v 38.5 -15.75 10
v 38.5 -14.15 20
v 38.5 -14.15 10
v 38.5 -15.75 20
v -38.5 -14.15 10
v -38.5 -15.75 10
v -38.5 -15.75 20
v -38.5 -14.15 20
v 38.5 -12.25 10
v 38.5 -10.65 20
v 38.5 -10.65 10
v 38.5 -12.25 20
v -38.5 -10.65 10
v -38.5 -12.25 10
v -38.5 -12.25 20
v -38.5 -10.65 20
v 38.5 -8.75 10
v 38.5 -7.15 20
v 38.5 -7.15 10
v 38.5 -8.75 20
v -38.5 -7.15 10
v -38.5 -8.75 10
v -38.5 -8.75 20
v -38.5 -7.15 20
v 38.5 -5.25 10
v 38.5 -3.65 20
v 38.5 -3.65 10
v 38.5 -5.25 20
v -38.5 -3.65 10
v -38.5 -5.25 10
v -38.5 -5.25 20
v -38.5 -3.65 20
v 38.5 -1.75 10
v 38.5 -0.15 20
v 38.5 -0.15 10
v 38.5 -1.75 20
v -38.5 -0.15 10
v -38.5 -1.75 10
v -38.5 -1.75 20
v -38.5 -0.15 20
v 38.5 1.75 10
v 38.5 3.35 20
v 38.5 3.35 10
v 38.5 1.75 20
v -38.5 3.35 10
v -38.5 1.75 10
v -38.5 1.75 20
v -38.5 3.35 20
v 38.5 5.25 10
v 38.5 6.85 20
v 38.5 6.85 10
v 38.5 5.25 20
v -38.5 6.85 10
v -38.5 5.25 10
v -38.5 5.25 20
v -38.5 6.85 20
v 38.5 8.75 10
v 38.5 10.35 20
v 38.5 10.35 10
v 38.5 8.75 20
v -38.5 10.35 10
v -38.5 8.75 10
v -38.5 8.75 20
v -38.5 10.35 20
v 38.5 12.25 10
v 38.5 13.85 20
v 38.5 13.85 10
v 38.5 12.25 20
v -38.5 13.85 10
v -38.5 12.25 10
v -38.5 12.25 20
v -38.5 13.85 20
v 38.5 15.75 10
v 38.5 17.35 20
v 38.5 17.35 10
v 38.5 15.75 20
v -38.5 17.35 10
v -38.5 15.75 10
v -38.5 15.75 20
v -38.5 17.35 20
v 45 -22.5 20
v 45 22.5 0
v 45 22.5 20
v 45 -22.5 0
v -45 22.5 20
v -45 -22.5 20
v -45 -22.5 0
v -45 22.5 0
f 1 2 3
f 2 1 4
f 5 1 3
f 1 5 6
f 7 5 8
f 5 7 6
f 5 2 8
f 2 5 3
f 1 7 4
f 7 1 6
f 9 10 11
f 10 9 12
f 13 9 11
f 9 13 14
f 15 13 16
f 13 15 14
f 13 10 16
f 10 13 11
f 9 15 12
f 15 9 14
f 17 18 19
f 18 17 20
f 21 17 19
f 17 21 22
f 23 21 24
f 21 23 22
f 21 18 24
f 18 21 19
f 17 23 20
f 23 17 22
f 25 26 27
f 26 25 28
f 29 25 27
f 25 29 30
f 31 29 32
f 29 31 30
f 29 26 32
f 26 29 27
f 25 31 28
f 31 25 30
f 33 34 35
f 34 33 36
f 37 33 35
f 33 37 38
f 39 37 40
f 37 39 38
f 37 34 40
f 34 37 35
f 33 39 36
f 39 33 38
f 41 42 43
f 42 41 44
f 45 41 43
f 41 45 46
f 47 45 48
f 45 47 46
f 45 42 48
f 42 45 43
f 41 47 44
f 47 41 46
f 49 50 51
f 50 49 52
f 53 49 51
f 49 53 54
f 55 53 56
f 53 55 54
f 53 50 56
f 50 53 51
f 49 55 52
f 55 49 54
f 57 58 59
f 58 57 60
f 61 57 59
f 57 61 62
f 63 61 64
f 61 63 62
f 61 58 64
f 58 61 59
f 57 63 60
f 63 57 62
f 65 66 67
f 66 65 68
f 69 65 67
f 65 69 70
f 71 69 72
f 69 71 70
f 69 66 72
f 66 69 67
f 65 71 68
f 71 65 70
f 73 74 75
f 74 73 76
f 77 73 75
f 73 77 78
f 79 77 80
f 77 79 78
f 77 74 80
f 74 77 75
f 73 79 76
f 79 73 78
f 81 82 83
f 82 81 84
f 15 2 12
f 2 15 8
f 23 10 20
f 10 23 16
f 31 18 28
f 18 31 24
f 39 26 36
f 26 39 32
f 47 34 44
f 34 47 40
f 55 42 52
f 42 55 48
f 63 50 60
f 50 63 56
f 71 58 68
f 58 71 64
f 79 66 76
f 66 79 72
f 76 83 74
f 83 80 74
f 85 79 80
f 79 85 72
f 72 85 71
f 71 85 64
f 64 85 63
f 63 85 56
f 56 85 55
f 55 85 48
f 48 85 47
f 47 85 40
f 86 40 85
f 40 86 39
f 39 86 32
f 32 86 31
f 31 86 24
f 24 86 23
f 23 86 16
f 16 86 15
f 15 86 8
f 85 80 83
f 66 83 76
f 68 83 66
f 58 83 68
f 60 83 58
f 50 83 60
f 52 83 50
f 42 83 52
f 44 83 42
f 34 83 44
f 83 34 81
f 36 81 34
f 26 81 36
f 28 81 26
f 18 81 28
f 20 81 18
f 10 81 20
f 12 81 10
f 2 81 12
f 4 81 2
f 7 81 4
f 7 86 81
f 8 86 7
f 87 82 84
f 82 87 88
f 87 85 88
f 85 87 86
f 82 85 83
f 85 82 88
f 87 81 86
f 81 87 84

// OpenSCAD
// Microscope slide drying rack
// Print orientation: base block on the bed (z = 0), slots open upward.

// ---------------- Parameters ----------------
block_len    = 90;    // block length along X (mm)
block_wid    = 45;    // block width along Y (mm)
block_h      = 20;    // block height along Z (mm)

slot_count   = 10;    // number of slide slots
slot_len     = 77;    // slot length along X (mm)
slot_w       = 1.6;   // slot width along Y (mm)
slot_depth   = 10;    // slot depth from top face (mm)
slot_pitch   = 3.5;   // centre-to-centre spacing in Y (mm)

eps          = 0.5;   // overshoot so cutters pass the top face

$fn = 64;

// ---------------- Model ----------------
difference() {
    // Base block, centred in X and Y, sitting on z = 0
    translate([-block_len/2, -block_wid/2, 0])
        cube([block_len, block_wid, block_h]);

    // Slot group, centred on the block in X and Y
    for (i = [0 : slot_count - 1]) {
        y = (i - (slot_count - 1)/2) * slot_pitch;
        translate([-slot_len/2, y, block_h - slot_depth])
            cube([slot_len, slot_w, slot_depth + eps]);
    }
}
